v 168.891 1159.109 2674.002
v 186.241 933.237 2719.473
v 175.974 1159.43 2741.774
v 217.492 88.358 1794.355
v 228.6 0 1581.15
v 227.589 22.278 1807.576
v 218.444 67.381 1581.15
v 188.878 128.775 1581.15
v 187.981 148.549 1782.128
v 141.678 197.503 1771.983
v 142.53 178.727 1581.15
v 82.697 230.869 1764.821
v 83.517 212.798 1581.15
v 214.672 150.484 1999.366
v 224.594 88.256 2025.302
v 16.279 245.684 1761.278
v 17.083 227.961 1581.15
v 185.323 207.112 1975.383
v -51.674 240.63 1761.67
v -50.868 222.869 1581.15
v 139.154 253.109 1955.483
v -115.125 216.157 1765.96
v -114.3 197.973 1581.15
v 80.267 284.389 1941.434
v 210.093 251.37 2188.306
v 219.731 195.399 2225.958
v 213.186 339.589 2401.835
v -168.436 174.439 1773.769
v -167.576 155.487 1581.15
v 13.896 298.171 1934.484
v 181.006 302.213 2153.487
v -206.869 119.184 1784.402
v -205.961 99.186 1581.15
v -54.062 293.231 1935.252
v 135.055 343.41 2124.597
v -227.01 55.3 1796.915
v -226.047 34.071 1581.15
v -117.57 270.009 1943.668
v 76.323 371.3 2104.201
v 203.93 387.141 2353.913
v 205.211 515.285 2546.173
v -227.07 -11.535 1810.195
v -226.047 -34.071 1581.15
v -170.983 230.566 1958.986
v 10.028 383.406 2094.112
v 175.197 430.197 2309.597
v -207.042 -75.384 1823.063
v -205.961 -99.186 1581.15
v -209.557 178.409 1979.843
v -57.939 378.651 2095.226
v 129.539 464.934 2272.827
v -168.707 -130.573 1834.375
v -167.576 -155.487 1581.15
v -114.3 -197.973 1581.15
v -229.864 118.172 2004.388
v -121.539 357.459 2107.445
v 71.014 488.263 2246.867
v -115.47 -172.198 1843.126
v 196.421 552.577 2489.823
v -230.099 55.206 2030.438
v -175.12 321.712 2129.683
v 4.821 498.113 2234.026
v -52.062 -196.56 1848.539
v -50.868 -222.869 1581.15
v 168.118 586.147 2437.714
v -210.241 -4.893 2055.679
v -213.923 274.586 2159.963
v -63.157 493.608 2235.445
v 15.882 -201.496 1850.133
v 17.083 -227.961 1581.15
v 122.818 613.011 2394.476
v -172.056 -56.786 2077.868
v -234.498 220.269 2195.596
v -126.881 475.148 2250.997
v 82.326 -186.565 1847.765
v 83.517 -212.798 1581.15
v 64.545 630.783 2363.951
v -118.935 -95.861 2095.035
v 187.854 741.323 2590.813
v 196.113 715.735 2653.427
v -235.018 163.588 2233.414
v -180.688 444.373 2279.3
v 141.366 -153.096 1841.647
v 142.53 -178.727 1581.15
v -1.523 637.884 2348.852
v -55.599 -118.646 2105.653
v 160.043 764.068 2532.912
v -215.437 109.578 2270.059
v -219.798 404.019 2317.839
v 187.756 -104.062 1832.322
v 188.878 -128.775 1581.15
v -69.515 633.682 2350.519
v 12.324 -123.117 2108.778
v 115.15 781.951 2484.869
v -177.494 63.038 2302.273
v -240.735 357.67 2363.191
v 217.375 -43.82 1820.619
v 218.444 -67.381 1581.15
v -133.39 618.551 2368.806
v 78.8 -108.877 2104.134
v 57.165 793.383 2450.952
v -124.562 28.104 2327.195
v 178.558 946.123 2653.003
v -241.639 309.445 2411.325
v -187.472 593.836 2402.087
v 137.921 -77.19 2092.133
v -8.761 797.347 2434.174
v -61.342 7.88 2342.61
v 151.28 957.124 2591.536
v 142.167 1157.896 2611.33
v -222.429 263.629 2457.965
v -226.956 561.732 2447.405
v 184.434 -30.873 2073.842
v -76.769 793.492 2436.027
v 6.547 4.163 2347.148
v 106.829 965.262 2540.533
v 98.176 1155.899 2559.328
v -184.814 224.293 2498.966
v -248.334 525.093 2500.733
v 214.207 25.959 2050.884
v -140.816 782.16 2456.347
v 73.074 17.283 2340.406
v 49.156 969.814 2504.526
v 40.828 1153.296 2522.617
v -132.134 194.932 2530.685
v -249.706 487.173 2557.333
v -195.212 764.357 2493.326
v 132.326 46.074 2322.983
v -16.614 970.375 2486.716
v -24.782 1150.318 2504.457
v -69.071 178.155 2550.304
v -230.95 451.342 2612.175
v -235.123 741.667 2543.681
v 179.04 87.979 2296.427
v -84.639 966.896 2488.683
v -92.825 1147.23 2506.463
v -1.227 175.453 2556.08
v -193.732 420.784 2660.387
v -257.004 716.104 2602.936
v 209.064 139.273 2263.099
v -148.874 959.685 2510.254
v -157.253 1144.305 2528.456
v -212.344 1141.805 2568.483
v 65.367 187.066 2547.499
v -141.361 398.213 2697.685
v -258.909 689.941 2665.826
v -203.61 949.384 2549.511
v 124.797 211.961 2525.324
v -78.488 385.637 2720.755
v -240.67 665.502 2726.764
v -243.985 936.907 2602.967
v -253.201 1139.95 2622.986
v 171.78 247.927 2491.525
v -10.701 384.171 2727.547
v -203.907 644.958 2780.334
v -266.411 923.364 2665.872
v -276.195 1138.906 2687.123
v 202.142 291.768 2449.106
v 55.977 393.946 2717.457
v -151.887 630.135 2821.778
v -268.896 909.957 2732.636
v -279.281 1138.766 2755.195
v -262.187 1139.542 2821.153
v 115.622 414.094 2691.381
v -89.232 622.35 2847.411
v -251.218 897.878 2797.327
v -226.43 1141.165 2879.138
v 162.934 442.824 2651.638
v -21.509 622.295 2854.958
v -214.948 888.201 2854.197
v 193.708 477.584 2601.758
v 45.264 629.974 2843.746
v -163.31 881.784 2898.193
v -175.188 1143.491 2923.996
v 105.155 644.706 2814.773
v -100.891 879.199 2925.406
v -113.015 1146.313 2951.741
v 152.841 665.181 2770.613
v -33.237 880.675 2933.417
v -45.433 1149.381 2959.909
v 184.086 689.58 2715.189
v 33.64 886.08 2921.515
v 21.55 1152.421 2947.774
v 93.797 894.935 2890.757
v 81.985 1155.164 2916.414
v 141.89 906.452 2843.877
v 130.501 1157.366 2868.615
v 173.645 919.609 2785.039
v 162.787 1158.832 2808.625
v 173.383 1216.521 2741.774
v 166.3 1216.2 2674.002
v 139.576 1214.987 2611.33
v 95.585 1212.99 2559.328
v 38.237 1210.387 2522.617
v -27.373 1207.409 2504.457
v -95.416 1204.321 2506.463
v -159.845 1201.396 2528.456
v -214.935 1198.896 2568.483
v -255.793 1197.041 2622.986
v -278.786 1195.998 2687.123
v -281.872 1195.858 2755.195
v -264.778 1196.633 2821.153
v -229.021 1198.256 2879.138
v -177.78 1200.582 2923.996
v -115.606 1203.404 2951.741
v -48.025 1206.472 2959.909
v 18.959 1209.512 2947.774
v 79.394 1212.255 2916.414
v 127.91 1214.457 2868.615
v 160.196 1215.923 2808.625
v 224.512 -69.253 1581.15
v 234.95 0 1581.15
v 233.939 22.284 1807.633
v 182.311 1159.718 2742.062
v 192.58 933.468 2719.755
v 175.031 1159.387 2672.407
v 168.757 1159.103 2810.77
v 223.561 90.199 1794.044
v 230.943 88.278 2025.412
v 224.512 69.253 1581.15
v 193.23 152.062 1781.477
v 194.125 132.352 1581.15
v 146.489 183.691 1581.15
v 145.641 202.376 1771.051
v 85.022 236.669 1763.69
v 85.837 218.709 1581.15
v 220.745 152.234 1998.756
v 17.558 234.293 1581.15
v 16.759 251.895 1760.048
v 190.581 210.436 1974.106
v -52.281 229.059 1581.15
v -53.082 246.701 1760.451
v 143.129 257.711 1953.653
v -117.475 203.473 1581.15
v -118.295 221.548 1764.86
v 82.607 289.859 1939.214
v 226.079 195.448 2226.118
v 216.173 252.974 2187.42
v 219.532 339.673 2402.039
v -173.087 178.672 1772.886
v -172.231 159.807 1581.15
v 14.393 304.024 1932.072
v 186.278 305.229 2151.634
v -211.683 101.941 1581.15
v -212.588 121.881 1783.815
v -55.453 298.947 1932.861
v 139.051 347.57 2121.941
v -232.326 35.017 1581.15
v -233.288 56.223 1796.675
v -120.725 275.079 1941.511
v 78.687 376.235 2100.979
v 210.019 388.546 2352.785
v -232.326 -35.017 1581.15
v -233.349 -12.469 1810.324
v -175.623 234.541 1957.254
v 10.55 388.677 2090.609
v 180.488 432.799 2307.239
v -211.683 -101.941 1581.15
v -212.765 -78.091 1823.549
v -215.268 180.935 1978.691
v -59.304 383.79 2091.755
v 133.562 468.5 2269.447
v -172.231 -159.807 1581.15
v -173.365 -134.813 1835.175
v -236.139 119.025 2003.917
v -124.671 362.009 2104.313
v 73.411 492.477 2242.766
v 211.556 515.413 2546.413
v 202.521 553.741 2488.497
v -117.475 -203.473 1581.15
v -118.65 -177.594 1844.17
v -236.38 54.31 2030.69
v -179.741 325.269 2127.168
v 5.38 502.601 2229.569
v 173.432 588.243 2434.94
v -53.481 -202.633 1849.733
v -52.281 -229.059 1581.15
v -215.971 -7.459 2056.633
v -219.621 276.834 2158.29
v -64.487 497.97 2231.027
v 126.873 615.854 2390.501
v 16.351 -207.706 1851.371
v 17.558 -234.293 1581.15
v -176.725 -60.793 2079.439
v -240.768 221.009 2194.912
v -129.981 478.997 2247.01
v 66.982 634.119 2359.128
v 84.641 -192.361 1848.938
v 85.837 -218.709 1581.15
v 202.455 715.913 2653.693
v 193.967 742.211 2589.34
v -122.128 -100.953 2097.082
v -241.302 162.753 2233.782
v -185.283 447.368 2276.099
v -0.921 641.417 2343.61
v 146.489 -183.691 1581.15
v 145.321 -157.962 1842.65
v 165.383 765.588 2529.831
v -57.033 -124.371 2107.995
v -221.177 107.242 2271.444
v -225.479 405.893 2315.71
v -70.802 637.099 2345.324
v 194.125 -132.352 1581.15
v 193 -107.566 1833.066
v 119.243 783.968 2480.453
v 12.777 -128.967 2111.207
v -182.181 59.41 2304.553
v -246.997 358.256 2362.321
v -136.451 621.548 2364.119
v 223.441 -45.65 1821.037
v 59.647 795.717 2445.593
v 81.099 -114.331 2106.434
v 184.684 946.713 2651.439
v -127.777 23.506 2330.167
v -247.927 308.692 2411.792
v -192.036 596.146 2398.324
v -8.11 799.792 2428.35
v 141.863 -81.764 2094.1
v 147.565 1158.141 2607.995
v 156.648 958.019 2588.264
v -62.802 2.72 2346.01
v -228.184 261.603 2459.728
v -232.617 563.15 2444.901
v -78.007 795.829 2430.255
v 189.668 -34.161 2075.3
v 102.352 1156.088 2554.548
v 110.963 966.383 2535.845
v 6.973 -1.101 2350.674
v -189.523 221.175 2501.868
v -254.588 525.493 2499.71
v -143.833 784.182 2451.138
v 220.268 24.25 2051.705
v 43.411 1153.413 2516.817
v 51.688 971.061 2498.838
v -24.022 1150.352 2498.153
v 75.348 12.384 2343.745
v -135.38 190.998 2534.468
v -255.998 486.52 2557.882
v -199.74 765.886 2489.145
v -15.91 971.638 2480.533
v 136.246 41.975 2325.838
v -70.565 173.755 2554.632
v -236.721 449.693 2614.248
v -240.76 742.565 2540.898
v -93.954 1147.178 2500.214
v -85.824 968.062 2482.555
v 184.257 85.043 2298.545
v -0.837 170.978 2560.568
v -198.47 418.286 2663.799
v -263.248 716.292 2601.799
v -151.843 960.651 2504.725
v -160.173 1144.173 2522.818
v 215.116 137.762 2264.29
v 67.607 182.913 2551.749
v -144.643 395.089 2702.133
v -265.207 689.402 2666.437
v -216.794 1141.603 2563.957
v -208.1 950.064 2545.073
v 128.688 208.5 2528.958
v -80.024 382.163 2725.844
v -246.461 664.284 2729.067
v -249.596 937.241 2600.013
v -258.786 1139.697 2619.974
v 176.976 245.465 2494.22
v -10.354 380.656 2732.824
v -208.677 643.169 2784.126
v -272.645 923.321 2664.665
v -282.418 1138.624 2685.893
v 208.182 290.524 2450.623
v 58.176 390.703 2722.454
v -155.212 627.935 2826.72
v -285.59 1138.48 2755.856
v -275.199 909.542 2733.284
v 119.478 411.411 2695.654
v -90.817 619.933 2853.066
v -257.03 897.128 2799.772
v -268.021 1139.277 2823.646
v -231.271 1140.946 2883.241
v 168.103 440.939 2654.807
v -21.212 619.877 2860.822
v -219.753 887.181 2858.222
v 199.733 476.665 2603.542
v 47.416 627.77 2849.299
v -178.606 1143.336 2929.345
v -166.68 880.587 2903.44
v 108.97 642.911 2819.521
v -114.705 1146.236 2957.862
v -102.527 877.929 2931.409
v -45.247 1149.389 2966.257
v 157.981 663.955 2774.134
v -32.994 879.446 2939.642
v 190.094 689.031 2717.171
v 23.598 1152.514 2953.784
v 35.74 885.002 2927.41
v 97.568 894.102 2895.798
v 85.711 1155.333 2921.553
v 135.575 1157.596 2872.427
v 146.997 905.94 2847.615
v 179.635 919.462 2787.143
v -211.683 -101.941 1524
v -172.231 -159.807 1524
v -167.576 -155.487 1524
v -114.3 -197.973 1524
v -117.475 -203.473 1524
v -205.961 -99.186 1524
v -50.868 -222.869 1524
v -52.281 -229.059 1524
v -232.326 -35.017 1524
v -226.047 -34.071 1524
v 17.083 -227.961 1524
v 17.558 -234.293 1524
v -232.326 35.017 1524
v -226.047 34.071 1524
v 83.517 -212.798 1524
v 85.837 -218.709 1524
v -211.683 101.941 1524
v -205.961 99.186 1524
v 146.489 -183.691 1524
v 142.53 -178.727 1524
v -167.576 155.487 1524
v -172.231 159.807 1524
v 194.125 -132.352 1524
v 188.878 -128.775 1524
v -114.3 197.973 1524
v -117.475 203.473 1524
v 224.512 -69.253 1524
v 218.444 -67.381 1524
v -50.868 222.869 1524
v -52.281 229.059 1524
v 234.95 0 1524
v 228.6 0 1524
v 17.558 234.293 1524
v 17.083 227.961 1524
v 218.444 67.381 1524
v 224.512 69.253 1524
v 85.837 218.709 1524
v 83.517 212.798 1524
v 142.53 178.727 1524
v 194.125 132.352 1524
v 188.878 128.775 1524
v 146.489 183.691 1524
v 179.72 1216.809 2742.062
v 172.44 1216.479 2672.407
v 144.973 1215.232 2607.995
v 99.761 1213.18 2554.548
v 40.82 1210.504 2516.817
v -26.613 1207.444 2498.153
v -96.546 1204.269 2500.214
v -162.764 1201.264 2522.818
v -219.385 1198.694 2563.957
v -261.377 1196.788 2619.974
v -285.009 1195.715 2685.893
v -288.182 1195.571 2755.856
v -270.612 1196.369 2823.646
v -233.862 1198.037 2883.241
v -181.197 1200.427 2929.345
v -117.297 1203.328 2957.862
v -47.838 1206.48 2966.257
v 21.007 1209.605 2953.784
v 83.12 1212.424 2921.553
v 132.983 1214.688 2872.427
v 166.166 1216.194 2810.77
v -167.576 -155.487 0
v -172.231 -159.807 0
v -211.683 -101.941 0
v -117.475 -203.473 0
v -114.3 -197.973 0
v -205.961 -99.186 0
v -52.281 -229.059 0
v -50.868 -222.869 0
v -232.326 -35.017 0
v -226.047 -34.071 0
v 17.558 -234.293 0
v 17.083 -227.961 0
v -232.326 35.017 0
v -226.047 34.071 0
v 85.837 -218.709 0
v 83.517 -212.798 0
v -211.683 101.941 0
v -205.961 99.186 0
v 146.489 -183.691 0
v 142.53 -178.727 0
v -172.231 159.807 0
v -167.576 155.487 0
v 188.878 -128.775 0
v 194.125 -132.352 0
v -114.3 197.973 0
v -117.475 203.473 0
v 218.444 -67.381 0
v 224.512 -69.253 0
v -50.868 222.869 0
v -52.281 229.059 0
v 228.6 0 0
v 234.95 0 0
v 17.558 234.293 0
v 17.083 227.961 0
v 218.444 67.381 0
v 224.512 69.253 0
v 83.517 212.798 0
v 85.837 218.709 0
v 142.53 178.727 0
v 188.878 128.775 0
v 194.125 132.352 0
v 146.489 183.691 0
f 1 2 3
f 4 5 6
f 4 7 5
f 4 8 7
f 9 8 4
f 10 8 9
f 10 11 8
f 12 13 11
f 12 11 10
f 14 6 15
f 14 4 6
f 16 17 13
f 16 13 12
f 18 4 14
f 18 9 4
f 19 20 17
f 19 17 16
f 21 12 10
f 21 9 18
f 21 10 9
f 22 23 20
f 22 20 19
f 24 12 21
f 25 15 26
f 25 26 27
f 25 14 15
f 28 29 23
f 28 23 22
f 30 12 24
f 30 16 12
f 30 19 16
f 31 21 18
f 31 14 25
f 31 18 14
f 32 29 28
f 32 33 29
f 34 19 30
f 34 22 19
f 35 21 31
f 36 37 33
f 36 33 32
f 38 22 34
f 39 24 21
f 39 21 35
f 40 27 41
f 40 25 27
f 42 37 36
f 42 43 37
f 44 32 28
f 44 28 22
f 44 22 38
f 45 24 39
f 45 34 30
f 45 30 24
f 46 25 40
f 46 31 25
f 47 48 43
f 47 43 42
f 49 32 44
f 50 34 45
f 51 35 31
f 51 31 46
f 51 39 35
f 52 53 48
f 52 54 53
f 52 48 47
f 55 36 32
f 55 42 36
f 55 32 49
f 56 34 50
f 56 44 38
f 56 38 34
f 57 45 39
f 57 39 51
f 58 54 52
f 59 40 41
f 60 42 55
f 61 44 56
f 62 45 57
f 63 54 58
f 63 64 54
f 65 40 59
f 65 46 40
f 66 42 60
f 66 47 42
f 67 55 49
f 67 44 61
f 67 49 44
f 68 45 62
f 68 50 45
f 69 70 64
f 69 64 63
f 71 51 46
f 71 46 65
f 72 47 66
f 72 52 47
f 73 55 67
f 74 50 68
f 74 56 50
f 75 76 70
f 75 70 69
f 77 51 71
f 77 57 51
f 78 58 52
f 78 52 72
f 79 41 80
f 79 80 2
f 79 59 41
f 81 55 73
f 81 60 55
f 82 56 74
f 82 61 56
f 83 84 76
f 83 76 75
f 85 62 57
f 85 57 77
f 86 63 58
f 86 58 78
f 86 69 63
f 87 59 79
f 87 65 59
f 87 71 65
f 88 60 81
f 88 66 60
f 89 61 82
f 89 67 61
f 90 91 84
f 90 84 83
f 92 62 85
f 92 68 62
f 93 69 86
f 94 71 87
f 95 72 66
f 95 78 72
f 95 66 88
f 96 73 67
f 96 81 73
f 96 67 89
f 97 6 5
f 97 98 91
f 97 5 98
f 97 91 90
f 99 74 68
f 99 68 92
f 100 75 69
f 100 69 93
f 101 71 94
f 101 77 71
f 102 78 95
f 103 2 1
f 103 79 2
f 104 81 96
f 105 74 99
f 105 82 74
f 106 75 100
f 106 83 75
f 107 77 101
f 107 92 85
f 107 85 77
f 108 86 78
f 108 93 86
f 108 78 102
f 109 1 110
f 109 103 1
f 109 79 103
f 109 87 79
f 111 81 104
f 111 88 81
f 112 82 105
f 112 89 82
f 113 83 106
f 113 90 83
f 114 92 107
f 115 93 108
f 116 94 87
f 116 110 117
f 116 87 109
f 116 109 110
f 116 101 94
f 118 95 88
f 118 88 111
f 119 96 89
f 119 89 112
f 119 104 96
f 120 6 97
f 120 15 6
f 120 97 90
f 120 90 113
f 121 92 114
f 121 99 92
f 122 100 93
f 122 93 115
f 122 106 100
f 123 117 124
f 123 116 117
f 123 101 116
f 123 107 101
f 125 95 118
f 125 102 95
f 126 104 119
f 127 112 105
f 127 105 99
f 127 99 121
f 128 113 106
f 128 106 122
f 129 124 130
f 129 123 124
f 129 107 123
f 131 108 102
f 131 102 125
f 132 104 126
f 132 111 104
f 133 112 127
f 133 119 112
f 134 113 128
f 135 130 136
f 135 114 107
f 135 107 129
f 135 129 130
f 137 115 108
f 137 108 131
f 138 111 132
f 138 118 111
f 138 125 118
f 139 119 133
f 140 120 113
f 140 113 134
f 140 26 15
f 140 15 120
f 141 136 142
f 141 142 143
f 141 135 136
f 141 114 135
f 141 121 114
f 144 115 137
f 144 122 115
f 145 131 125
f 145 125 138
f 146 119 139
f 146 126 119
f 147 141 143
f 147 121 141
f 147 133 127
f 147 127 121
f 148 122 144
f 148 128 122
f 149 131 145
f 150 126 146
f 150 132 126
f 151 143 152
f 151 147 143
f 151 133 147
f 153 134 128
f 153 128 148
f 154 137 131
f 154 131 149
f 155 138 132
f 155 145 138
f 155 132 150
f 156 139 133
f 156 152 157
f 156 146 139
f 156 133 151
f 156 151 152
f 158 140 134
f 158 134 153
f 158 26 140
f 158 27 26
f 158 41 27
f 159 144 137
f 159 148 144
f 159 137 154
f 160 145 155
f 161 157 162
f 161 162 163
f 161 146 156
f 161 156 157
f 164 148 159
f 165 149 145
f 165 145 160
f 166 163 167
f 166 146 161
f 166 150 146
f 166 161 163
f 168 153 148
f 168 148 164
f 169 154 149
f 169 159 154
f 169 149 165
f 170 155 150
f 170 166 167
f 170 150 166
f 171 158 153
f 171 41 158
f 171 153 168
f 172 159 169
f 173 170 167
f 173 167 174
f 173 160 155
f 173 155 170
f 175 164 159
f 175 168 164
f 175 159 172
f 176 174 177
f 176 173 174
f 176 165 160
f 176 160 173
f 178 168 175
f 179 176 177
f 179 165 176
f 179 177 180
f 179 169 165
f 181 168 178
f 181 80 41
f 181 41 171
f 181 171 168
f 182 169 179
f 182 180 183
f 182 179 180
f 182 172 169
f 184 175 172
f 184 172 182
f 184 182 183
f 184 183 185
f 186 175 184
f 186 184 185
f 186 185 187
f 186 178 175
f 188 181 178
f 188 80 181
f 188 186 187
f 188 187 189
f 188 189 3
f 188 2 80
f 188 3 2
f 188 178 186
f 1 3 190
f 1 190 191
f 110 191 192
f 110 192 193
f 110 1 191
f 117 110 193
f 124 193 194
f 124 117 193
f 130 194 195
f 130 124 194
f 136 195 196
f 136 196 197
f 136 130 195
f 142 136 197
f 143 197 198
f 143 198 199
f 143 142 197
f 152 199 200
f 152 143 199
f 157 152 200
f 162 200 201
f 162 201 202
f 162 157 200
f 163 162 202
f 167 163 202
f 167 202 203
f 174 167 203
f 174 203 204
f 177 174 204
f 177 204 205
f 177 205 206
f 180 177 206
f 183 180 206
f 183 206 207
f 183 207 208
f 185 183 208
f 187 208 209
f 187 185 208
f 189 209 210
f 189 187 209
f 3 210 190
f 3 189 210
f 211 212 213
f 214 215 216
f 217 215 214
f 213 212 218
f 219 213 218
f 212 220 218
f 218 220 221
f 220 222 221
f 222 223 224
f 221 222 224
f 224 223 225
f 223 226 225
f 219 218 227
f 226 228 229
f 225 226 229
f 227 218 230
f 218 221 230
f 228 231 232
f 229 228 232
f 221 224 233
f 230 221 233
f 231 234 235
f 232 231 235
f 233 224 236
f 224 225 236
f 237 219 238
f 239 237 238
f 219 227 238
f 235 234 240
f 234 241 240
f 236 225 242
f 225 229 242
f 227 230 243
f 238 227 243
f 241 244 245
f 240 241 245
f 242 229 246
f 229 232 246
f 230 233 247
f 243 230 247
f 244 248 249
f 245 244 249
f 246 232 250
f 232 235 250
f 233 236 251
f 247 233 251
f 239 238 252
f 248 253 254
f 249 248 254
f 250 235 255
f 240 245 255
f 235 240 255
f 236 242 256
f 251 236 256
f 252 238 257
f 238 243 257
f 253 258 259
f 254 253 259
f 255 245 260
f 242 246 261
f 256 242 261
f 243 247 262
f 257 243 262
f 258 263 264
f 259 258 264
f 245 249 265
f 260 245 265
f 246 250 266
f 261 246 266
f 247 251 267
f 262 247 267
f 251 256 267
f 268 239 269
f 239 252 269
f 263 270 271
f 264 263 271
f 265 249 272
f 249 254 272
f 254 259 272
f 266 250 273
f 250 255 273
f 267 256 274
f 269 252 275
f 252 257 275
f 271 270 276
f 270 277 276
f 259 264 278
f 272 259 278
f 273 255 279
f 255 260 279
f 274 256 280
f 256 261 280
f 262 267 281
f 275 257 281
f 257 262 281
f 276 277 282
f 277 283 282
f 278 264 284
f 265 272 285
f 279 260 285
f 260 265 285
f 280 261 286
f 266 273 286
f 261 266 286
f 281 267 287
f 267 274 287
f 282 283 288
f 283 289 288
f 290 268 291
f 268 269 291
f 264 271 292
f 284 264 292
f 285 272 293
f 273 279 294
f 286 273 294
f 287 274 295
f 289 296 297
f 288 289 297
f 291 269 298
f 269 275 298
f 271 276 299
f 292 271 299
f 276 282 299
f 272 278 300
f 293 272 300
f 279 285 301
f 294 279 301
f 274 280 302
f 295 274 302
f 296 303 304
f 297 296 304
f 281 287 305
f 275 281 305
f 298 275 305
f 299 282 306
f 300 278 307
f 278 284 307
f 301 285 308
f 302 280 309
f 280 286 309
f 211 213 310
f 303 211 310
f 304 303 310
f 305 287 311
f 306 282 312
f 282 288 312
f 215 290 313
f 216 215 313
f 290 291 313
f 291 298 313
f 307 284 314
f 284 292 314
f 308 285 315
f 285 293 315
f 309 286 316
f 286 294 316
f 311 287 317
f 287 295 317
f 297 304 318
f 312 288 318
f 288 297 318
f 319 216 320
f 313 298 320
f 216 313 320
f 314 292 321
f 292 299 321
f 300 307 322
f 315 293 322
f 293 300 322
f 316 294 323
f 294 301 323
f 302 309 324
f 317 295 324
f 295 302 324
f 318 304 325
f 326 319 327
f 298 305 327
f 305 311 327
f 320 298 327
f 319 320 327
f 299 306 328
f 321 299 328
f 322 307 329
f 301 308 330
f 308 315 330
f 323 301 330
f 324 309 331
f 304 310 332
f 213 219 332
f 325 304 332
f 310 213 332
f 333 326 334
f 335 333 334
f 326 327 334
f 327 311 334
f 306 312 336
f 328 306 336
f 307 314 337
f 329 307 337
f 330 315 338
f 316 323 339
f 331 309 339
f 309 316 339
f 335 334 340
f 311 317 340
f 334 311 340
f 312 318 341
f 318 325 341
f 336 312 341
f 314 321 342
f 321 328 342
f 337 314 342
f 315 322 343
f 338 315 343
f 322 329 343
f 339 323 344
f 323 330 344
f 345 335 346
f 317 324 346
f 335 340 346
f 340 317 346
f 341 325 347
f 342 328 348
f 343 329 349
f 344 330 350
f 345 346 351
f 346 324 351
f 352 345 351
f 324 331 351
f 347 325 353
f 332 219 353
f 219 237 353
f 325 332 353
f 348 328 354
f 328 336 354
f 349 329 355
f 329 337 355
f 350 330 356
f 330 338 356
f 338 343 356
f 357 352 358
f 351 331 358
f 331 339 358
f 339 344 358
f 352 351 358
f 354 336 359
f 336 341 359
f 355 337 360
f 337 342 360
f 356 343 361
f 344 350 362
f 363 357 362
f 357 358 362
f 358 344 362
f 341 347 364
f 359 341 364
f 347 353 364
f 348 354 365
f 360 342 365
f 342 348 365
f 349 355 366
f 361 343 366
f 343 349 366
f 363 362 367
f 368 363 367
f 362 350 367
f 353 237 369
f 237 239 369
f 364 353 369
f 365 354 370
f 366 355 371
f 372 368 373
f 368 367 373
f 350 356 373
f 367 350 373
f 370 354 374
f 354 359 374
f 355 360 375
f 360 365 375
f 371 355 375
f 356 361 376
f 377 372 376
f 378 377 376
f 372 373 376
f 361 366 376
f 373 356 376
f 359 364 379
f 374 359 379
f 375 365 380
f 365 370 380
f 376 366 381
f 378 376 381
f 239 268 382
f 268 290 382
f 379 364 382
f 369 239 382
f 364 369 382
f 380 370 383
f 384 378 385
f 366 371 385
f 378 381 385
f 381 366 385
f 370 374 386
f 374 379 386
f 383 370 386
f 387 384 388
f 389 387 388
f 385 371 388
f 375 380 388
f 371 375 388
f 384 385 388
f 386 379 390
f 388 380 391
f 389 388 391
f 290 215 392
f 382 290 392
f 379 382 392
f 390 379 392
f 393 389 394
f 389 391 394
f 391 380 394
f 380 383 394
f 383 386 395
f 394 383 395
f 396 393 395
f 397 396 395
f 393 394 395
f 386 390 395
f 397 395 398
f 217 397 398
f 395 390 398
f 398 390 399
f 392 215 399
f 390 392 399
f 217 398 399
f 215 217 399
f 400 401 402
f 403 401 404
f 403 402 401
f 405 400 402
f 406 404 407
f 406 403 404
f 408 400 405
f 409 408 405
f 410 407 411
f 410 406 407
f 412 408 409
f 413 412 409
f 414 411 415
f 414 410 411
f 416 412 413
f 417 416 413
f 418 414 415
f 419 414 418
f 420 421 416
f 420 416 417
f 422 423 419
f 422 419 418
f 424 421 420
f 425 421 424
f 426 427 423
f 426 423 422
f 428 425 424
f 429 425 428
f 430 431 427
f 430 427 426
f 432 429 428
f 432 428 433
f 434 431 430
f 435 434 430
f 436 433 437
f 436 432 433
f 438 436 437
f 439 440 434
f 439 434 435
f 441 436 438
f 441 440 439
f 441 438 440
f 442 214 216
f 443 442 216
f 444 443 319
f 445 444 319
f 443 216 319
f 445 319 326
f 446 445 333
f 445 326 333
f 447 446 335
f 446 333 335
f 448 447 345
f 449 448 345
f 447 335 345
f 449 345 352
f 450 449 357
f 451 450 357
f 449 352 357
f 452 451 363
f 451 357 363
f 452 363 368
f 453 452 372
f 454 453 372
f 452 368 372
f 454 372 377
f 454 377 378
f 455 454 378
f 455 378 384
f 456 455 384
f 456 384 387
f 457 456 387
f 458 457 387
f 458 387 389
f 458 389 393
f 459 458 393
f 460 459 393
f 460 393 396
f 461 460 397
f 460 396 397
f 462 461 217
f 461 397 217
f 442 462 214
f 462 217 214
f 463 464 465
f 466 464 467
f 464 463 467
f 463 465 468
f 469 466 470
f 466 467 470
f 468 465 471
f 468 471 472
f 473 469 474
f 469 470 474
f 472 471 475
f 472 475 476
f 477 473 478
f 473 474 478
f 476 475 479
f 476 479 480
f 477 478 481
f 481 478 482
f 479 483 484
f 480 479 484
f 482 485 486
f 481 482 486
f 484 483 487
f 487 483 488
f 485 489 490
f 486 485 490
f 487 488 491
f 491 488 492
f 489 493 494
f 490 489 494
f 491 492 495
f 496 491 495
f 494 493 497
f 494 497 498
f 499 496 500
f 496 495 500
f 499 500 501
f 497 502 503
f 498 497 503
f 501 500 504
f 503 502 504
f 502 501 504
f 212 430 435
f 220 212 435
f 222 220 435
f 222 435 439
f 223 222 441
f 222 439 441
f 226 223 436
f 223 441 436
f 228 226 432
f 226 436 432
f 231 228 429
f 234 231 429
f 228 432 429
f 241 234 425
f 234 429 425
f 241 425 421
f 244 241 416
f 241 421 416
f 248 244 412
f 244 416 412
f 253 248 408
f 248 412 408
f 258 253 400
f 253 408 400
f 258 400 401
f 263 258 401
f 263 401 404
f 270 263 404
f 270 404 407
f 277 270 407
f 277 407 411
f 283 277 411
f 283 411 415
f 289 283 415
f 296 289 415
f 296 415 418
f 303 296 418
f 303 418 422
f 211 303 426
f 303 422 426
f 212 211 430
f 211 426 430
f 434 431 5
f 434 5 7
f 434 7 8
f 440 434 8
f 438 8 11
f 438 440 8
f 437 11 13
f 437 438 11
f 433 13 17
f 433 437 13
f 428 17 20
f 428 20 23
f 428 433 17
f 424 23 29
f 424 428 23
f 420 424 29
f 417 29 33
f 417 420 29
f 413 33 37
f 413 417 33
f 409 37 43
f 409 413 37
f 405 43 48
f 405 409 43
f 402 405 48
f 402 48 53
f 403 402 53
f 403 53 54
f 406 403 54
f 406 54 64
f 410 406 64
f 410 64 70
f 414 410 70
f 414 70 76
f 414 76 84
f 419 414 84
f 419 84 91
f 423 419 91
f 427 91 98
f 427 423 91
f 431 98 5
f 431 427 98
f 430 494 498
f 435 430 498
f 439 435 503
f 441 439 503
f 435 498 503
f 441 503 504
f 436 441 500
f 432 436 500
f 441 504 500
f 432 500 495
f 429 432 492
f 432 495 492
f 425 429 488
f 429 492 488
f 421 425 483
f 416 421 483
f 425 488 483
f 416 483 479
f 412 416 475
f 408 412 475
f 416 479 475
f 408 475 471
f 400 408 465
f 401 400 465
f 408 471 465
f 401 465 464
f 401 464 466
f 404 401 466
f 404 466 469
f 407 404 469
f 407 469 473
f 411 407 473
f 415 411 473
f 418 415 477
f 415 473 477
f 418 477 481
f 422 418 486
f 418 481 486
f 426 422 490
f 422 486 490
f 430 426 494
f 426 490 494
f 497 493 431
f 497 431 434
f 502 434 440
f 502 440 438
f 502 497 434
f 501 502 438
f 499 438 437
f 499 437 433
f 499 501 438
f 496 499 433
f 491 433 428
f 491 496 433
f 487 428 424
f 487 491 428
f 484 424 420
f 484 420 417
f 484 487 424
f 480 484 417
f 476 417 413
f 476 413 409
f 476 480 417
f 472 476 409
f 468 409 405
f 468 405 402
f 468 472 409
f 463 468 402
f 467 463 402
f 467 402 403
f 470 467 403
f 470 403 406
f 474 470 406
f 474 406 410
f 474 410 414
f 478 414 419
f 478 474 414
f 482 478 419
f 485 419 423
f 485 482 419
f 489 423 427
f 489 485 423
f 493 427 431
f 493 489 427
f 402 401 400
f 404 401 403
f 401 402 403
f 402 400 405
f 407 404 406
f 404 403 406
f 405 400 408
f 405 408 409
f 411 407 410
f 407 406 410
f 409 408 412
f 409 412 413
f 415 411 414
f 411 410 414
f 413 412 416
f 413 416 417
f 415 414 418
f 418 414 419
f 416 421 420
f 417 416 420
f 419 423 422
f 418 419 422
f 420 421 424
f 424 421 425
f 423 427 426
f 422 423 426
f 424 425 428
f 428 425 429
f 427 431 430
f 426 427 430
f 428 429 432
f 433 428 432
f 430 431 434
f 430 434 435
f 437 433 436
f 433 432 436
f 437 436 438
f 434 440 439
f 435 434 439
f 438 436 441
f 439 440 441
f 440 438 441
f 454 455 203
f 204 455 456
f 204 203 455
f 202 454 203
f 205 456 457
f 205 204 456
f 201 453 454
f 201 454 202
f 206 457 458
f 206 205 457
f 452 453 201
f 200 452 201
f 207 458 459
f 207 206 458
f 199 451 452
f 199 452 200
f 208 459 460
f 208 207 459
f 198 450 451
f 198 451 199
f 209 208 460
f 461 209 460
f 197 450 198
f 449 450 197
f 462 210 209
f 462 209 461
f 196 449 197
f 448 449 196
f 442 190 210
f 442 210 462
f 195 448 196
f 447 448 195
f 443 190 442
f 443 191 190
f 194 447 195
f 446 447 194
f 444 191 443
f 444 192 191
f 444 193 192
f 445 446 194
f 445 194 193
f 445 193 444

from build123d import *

# Parameters (mm, degrees)
F0_R        = 234.95
F0_R_2      = 228.6
F1_DEPTH    = 1524
F4_DEPTH    = 57.15
F4_FACE_R   = 234.95
F4_FACE_R_2 = 228.6
F5_ANGLE    = 90
F6_DEPTH    = 57.15


with BuildPart() as f1:
    # F0 (on Top) → F1 (new body)
    with BuildSketch(Plane.XY):
        Circle(F0_R)
        Circle(F0_R_2, mode=Mode.SUBTRACT)
    extrude(amount=F1_DEPTH)


with BuildPart() as f4:
    # F4 (new): a face of the model
    f4_faces = [f1.part.faces().sort_by_distance(p)[0] for p in [
        (-234.285461047, 0, 1524),
    ]]
    extrude(f4_faces, amount=F4_DEPTH)

    # F4_face (on face) → F5 (revolve)
    with BuildSketch(Plane.XY.offset(1581.15)):
        Circle(F4_FACE_R)
        Circle(F4_FACE_R_2, mode=Mode.SUBTRACT)
    revolve(axis=Axis((-93.0036529899, 1147.2213830948, 1581.15), (-0.9989714886, -0.0453427497, 0)), revolution_arc=F5_ANGLE)

    # F6 (add): a face of the model
    f6_faces = [f4.faces().sort_by_distance(p)[0] for p in [
        (-285.9596612882, 1138.4632192455, 2720.7853471814),
    ]]
    extrude(f6_faces, amount=F6_DEPTH)


solid = Compound([f1.part, f4.part])
